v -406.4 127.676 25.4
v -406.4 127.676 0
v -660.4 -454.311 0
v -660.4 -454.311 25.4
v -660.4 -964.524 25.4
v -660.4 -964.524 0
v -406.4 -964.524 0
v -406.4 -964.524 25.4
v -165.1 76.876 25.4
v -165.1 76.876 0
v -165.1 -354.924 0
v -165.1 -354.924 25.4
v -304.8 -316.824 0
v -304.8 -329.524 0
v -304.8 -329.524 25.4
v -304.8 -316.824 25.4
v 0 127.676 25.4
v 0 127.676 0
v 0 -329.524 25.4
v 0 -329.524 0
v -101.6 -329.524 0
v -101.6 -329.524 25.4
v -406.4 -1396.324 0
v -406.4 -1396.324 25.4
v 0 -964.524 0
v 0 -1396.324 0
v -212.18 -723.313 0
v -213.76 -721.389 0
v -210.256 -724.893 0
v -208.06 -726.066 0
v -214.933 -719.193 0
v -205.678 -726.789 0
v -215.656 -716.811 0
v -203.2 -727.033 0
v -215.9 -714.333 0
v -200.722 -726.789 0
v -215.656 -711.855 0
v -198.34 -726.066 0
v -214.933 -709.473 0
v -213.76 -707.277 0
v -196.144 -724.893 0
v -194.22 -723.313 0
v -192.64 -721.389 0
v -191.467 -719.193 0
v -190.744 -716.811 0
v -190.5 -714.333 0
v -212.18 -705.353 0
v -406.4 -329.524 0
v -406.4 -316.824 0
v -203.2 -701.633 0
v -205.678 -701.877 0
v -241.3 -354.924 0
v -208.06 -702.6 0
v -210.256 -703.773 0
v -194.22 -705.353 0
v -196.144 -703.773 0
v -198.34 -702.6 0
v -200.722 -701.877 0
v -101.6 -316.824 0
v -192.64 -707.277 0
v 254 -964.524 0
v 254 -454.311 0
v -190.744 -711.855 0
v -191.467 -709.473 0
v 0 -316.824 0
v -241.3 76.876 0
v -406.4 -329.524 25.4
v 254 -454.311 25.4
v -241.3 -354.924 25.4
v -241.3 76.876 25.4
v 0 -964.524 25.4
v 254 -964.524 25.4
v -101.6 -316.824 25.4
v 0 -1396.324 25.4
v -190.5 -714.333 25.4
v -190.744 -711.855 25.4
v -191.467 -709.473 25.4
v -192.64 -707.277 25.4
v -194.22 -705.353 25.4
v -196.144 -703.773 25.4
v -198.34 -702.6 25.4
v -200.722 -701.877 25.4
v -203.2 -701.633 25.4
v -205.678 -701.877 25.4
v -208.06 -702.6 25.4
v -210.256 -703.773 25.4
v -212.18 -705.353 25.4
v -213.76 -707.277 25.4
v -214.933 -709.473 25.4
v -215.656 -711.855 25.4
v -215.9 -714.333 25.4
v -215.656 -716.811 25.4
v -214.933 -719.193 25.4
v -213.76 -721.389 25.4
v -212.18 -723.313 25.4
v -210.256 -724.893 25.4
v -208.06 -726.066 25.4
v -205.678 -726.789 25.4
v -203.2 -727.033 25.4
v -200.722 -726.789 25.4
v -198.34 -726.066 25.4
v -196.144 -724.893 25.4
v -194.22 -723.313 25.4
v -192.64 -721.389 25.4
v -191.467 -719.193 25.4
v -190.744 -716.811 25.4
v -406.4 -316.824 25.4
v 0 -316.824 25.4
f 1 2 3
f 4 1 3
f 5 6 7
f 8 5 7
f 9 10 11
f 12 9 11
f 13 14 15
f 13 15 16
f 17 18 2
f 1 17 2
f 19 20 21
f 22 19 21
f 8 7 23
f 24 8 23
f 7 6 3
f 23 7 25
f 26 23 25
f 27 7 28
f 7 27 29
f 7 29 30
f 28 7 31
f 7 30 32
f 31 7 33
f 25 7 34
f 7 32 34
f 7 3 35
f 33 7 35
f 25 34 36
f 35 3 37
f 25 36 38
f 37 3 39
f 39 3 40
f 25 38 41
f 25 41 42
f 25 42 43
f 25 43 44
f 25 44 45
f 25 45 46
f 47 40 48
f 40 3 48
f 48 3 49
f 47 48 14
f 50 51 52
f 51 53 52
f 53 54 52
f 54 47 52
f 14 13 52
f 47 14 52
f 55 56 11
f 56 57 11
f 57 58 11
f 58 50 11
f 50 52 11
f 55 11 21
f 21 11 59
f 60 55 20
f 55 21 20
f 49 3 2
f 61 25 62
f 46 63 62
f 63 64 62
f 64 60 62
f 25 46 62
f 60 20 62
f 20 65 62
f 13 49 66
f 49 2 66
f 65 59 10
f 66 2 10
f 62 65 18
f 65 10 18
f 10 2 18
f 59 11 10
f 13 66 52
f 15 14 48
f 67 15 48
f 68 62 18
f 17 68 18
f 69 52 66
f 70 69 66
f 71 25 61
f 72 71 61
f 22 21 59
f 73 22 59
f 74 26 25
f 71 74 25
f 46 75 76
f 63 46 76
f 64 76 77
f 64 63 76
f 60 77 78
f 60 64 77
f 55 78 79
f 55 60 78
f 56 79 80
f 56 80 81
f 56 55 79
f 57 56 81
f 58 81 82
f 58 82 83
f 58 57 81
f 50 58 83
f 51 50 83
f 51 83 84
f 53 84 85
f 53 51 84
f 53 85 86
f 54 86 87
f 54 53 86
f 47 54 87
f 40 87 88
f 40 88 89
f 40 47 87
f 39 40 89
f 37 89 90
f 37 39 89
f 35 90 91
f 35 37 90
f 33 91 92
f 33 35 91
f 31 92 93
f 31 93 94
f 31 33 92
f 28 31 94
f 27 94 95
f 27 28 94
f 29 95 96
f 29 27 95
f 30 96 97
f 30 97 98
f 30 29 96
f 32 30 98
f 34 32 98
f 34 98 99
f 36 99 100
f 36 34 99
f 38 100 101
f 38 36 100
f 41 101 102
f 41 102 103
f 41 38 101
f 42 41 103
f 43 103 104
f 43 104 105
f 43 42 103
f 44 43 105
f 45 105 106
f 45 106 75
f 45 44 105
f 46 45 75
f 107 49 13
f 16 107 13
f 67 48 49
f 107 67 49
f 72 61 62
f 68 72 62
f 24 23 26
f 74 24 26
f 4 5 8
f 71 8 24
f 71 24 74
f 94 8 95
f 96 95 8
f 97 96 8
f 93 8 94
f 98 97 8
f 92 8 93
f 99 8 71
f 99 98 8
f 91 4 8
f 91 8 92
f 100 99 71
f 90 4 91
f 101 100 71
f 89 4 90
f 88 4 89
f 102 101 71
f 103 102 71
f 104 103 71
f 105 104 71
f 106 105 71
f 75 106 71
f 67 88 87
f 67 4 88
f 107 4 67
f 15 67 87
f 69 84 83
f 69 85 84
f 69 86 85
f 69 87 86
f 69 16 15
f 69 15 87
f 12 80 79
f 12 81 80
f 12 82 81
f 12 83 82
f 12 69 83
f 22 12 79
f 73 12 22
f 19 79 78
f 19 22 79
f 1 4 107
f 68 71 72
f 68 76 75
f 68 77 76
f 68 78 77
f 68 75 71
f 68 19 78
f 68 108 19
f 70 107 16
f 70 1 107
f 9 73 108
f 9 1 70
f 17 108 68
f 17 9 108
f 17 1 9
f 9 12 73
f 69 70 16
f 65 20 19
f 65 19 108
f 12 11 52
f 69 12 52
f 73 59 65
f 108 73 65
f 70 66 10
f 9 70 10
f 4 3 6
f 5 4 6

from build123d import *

# Parameters (mm, degrees)
F0_R     = 12.7
F0_W     = 50.8
F0_H     = 12.7
F0_W_2   = 63.5
F1_DEPTH = 25.4


# Not quite as in the source:
# - a feature names something its author has since deleted; it is built from what else it names


with BuildPart() as f1:
    # F0 (on Top) → F1 (new body)
    with BuildSketch(Plane.XY):
        Polygon((-406.4, -964.5238018036), (-406.4, -1396.3238018036), (0, -1396.3238018036), (0, -964.5238018036), (254, -964.5238018036), (254, -454.310915063), (0, 127.6761981964), (-406.4, 127.6761981964), (-660.4, -454.310915063), (-660.4, -964.5238018036), align=None)
        with Locations((-203.2, -714.3330844099)):
            Circle(F0_R, mode=Mode.SUBTRACT)
        Polygon((-241.3, -316.8238018036), (-241.3, 76.8761981964), (-165.1, 76.8761981964), (-165.1, -316.8238018036), (-101.6, -316.8238018036), (0, -316.8238018036), (50.8, -316.8238018036), (50.8, -329.5238018036), (0, -329.5238018036), (-101.6, -329.5238018036), (-165.1, -329.5238018036), (-165.1, -354.9238018036), (-241.3, -354.9238018036), (-241.3, -329.5238018036), (-304.8, -329.5238018036), (-406.4, -329.5238018036), (-457.2, -329.5238018036), (-457.2, -316.8238018036), (-406.4, -316.8238018036), (-304.8, -316.8238018036), align=None, mode=Mode.SUBTRACT)
        with Locations((-431.8, -323.1738018036)):
            Rectangle(F0_W, F0_H)
        with Locations((-133.35, -323.1738018036)):
            Rectangle(F0_W_2, F0_H)
        with Locations((25.4, -323.1738018036)):
            Rectangle(F0_W, F0_H)
        with Locations((-273.05, -323.1738018036)):
            Rectangle(F0_W_2, F0_H)
    extrude(amount=F1_DEPTH)


solid = f1.part
